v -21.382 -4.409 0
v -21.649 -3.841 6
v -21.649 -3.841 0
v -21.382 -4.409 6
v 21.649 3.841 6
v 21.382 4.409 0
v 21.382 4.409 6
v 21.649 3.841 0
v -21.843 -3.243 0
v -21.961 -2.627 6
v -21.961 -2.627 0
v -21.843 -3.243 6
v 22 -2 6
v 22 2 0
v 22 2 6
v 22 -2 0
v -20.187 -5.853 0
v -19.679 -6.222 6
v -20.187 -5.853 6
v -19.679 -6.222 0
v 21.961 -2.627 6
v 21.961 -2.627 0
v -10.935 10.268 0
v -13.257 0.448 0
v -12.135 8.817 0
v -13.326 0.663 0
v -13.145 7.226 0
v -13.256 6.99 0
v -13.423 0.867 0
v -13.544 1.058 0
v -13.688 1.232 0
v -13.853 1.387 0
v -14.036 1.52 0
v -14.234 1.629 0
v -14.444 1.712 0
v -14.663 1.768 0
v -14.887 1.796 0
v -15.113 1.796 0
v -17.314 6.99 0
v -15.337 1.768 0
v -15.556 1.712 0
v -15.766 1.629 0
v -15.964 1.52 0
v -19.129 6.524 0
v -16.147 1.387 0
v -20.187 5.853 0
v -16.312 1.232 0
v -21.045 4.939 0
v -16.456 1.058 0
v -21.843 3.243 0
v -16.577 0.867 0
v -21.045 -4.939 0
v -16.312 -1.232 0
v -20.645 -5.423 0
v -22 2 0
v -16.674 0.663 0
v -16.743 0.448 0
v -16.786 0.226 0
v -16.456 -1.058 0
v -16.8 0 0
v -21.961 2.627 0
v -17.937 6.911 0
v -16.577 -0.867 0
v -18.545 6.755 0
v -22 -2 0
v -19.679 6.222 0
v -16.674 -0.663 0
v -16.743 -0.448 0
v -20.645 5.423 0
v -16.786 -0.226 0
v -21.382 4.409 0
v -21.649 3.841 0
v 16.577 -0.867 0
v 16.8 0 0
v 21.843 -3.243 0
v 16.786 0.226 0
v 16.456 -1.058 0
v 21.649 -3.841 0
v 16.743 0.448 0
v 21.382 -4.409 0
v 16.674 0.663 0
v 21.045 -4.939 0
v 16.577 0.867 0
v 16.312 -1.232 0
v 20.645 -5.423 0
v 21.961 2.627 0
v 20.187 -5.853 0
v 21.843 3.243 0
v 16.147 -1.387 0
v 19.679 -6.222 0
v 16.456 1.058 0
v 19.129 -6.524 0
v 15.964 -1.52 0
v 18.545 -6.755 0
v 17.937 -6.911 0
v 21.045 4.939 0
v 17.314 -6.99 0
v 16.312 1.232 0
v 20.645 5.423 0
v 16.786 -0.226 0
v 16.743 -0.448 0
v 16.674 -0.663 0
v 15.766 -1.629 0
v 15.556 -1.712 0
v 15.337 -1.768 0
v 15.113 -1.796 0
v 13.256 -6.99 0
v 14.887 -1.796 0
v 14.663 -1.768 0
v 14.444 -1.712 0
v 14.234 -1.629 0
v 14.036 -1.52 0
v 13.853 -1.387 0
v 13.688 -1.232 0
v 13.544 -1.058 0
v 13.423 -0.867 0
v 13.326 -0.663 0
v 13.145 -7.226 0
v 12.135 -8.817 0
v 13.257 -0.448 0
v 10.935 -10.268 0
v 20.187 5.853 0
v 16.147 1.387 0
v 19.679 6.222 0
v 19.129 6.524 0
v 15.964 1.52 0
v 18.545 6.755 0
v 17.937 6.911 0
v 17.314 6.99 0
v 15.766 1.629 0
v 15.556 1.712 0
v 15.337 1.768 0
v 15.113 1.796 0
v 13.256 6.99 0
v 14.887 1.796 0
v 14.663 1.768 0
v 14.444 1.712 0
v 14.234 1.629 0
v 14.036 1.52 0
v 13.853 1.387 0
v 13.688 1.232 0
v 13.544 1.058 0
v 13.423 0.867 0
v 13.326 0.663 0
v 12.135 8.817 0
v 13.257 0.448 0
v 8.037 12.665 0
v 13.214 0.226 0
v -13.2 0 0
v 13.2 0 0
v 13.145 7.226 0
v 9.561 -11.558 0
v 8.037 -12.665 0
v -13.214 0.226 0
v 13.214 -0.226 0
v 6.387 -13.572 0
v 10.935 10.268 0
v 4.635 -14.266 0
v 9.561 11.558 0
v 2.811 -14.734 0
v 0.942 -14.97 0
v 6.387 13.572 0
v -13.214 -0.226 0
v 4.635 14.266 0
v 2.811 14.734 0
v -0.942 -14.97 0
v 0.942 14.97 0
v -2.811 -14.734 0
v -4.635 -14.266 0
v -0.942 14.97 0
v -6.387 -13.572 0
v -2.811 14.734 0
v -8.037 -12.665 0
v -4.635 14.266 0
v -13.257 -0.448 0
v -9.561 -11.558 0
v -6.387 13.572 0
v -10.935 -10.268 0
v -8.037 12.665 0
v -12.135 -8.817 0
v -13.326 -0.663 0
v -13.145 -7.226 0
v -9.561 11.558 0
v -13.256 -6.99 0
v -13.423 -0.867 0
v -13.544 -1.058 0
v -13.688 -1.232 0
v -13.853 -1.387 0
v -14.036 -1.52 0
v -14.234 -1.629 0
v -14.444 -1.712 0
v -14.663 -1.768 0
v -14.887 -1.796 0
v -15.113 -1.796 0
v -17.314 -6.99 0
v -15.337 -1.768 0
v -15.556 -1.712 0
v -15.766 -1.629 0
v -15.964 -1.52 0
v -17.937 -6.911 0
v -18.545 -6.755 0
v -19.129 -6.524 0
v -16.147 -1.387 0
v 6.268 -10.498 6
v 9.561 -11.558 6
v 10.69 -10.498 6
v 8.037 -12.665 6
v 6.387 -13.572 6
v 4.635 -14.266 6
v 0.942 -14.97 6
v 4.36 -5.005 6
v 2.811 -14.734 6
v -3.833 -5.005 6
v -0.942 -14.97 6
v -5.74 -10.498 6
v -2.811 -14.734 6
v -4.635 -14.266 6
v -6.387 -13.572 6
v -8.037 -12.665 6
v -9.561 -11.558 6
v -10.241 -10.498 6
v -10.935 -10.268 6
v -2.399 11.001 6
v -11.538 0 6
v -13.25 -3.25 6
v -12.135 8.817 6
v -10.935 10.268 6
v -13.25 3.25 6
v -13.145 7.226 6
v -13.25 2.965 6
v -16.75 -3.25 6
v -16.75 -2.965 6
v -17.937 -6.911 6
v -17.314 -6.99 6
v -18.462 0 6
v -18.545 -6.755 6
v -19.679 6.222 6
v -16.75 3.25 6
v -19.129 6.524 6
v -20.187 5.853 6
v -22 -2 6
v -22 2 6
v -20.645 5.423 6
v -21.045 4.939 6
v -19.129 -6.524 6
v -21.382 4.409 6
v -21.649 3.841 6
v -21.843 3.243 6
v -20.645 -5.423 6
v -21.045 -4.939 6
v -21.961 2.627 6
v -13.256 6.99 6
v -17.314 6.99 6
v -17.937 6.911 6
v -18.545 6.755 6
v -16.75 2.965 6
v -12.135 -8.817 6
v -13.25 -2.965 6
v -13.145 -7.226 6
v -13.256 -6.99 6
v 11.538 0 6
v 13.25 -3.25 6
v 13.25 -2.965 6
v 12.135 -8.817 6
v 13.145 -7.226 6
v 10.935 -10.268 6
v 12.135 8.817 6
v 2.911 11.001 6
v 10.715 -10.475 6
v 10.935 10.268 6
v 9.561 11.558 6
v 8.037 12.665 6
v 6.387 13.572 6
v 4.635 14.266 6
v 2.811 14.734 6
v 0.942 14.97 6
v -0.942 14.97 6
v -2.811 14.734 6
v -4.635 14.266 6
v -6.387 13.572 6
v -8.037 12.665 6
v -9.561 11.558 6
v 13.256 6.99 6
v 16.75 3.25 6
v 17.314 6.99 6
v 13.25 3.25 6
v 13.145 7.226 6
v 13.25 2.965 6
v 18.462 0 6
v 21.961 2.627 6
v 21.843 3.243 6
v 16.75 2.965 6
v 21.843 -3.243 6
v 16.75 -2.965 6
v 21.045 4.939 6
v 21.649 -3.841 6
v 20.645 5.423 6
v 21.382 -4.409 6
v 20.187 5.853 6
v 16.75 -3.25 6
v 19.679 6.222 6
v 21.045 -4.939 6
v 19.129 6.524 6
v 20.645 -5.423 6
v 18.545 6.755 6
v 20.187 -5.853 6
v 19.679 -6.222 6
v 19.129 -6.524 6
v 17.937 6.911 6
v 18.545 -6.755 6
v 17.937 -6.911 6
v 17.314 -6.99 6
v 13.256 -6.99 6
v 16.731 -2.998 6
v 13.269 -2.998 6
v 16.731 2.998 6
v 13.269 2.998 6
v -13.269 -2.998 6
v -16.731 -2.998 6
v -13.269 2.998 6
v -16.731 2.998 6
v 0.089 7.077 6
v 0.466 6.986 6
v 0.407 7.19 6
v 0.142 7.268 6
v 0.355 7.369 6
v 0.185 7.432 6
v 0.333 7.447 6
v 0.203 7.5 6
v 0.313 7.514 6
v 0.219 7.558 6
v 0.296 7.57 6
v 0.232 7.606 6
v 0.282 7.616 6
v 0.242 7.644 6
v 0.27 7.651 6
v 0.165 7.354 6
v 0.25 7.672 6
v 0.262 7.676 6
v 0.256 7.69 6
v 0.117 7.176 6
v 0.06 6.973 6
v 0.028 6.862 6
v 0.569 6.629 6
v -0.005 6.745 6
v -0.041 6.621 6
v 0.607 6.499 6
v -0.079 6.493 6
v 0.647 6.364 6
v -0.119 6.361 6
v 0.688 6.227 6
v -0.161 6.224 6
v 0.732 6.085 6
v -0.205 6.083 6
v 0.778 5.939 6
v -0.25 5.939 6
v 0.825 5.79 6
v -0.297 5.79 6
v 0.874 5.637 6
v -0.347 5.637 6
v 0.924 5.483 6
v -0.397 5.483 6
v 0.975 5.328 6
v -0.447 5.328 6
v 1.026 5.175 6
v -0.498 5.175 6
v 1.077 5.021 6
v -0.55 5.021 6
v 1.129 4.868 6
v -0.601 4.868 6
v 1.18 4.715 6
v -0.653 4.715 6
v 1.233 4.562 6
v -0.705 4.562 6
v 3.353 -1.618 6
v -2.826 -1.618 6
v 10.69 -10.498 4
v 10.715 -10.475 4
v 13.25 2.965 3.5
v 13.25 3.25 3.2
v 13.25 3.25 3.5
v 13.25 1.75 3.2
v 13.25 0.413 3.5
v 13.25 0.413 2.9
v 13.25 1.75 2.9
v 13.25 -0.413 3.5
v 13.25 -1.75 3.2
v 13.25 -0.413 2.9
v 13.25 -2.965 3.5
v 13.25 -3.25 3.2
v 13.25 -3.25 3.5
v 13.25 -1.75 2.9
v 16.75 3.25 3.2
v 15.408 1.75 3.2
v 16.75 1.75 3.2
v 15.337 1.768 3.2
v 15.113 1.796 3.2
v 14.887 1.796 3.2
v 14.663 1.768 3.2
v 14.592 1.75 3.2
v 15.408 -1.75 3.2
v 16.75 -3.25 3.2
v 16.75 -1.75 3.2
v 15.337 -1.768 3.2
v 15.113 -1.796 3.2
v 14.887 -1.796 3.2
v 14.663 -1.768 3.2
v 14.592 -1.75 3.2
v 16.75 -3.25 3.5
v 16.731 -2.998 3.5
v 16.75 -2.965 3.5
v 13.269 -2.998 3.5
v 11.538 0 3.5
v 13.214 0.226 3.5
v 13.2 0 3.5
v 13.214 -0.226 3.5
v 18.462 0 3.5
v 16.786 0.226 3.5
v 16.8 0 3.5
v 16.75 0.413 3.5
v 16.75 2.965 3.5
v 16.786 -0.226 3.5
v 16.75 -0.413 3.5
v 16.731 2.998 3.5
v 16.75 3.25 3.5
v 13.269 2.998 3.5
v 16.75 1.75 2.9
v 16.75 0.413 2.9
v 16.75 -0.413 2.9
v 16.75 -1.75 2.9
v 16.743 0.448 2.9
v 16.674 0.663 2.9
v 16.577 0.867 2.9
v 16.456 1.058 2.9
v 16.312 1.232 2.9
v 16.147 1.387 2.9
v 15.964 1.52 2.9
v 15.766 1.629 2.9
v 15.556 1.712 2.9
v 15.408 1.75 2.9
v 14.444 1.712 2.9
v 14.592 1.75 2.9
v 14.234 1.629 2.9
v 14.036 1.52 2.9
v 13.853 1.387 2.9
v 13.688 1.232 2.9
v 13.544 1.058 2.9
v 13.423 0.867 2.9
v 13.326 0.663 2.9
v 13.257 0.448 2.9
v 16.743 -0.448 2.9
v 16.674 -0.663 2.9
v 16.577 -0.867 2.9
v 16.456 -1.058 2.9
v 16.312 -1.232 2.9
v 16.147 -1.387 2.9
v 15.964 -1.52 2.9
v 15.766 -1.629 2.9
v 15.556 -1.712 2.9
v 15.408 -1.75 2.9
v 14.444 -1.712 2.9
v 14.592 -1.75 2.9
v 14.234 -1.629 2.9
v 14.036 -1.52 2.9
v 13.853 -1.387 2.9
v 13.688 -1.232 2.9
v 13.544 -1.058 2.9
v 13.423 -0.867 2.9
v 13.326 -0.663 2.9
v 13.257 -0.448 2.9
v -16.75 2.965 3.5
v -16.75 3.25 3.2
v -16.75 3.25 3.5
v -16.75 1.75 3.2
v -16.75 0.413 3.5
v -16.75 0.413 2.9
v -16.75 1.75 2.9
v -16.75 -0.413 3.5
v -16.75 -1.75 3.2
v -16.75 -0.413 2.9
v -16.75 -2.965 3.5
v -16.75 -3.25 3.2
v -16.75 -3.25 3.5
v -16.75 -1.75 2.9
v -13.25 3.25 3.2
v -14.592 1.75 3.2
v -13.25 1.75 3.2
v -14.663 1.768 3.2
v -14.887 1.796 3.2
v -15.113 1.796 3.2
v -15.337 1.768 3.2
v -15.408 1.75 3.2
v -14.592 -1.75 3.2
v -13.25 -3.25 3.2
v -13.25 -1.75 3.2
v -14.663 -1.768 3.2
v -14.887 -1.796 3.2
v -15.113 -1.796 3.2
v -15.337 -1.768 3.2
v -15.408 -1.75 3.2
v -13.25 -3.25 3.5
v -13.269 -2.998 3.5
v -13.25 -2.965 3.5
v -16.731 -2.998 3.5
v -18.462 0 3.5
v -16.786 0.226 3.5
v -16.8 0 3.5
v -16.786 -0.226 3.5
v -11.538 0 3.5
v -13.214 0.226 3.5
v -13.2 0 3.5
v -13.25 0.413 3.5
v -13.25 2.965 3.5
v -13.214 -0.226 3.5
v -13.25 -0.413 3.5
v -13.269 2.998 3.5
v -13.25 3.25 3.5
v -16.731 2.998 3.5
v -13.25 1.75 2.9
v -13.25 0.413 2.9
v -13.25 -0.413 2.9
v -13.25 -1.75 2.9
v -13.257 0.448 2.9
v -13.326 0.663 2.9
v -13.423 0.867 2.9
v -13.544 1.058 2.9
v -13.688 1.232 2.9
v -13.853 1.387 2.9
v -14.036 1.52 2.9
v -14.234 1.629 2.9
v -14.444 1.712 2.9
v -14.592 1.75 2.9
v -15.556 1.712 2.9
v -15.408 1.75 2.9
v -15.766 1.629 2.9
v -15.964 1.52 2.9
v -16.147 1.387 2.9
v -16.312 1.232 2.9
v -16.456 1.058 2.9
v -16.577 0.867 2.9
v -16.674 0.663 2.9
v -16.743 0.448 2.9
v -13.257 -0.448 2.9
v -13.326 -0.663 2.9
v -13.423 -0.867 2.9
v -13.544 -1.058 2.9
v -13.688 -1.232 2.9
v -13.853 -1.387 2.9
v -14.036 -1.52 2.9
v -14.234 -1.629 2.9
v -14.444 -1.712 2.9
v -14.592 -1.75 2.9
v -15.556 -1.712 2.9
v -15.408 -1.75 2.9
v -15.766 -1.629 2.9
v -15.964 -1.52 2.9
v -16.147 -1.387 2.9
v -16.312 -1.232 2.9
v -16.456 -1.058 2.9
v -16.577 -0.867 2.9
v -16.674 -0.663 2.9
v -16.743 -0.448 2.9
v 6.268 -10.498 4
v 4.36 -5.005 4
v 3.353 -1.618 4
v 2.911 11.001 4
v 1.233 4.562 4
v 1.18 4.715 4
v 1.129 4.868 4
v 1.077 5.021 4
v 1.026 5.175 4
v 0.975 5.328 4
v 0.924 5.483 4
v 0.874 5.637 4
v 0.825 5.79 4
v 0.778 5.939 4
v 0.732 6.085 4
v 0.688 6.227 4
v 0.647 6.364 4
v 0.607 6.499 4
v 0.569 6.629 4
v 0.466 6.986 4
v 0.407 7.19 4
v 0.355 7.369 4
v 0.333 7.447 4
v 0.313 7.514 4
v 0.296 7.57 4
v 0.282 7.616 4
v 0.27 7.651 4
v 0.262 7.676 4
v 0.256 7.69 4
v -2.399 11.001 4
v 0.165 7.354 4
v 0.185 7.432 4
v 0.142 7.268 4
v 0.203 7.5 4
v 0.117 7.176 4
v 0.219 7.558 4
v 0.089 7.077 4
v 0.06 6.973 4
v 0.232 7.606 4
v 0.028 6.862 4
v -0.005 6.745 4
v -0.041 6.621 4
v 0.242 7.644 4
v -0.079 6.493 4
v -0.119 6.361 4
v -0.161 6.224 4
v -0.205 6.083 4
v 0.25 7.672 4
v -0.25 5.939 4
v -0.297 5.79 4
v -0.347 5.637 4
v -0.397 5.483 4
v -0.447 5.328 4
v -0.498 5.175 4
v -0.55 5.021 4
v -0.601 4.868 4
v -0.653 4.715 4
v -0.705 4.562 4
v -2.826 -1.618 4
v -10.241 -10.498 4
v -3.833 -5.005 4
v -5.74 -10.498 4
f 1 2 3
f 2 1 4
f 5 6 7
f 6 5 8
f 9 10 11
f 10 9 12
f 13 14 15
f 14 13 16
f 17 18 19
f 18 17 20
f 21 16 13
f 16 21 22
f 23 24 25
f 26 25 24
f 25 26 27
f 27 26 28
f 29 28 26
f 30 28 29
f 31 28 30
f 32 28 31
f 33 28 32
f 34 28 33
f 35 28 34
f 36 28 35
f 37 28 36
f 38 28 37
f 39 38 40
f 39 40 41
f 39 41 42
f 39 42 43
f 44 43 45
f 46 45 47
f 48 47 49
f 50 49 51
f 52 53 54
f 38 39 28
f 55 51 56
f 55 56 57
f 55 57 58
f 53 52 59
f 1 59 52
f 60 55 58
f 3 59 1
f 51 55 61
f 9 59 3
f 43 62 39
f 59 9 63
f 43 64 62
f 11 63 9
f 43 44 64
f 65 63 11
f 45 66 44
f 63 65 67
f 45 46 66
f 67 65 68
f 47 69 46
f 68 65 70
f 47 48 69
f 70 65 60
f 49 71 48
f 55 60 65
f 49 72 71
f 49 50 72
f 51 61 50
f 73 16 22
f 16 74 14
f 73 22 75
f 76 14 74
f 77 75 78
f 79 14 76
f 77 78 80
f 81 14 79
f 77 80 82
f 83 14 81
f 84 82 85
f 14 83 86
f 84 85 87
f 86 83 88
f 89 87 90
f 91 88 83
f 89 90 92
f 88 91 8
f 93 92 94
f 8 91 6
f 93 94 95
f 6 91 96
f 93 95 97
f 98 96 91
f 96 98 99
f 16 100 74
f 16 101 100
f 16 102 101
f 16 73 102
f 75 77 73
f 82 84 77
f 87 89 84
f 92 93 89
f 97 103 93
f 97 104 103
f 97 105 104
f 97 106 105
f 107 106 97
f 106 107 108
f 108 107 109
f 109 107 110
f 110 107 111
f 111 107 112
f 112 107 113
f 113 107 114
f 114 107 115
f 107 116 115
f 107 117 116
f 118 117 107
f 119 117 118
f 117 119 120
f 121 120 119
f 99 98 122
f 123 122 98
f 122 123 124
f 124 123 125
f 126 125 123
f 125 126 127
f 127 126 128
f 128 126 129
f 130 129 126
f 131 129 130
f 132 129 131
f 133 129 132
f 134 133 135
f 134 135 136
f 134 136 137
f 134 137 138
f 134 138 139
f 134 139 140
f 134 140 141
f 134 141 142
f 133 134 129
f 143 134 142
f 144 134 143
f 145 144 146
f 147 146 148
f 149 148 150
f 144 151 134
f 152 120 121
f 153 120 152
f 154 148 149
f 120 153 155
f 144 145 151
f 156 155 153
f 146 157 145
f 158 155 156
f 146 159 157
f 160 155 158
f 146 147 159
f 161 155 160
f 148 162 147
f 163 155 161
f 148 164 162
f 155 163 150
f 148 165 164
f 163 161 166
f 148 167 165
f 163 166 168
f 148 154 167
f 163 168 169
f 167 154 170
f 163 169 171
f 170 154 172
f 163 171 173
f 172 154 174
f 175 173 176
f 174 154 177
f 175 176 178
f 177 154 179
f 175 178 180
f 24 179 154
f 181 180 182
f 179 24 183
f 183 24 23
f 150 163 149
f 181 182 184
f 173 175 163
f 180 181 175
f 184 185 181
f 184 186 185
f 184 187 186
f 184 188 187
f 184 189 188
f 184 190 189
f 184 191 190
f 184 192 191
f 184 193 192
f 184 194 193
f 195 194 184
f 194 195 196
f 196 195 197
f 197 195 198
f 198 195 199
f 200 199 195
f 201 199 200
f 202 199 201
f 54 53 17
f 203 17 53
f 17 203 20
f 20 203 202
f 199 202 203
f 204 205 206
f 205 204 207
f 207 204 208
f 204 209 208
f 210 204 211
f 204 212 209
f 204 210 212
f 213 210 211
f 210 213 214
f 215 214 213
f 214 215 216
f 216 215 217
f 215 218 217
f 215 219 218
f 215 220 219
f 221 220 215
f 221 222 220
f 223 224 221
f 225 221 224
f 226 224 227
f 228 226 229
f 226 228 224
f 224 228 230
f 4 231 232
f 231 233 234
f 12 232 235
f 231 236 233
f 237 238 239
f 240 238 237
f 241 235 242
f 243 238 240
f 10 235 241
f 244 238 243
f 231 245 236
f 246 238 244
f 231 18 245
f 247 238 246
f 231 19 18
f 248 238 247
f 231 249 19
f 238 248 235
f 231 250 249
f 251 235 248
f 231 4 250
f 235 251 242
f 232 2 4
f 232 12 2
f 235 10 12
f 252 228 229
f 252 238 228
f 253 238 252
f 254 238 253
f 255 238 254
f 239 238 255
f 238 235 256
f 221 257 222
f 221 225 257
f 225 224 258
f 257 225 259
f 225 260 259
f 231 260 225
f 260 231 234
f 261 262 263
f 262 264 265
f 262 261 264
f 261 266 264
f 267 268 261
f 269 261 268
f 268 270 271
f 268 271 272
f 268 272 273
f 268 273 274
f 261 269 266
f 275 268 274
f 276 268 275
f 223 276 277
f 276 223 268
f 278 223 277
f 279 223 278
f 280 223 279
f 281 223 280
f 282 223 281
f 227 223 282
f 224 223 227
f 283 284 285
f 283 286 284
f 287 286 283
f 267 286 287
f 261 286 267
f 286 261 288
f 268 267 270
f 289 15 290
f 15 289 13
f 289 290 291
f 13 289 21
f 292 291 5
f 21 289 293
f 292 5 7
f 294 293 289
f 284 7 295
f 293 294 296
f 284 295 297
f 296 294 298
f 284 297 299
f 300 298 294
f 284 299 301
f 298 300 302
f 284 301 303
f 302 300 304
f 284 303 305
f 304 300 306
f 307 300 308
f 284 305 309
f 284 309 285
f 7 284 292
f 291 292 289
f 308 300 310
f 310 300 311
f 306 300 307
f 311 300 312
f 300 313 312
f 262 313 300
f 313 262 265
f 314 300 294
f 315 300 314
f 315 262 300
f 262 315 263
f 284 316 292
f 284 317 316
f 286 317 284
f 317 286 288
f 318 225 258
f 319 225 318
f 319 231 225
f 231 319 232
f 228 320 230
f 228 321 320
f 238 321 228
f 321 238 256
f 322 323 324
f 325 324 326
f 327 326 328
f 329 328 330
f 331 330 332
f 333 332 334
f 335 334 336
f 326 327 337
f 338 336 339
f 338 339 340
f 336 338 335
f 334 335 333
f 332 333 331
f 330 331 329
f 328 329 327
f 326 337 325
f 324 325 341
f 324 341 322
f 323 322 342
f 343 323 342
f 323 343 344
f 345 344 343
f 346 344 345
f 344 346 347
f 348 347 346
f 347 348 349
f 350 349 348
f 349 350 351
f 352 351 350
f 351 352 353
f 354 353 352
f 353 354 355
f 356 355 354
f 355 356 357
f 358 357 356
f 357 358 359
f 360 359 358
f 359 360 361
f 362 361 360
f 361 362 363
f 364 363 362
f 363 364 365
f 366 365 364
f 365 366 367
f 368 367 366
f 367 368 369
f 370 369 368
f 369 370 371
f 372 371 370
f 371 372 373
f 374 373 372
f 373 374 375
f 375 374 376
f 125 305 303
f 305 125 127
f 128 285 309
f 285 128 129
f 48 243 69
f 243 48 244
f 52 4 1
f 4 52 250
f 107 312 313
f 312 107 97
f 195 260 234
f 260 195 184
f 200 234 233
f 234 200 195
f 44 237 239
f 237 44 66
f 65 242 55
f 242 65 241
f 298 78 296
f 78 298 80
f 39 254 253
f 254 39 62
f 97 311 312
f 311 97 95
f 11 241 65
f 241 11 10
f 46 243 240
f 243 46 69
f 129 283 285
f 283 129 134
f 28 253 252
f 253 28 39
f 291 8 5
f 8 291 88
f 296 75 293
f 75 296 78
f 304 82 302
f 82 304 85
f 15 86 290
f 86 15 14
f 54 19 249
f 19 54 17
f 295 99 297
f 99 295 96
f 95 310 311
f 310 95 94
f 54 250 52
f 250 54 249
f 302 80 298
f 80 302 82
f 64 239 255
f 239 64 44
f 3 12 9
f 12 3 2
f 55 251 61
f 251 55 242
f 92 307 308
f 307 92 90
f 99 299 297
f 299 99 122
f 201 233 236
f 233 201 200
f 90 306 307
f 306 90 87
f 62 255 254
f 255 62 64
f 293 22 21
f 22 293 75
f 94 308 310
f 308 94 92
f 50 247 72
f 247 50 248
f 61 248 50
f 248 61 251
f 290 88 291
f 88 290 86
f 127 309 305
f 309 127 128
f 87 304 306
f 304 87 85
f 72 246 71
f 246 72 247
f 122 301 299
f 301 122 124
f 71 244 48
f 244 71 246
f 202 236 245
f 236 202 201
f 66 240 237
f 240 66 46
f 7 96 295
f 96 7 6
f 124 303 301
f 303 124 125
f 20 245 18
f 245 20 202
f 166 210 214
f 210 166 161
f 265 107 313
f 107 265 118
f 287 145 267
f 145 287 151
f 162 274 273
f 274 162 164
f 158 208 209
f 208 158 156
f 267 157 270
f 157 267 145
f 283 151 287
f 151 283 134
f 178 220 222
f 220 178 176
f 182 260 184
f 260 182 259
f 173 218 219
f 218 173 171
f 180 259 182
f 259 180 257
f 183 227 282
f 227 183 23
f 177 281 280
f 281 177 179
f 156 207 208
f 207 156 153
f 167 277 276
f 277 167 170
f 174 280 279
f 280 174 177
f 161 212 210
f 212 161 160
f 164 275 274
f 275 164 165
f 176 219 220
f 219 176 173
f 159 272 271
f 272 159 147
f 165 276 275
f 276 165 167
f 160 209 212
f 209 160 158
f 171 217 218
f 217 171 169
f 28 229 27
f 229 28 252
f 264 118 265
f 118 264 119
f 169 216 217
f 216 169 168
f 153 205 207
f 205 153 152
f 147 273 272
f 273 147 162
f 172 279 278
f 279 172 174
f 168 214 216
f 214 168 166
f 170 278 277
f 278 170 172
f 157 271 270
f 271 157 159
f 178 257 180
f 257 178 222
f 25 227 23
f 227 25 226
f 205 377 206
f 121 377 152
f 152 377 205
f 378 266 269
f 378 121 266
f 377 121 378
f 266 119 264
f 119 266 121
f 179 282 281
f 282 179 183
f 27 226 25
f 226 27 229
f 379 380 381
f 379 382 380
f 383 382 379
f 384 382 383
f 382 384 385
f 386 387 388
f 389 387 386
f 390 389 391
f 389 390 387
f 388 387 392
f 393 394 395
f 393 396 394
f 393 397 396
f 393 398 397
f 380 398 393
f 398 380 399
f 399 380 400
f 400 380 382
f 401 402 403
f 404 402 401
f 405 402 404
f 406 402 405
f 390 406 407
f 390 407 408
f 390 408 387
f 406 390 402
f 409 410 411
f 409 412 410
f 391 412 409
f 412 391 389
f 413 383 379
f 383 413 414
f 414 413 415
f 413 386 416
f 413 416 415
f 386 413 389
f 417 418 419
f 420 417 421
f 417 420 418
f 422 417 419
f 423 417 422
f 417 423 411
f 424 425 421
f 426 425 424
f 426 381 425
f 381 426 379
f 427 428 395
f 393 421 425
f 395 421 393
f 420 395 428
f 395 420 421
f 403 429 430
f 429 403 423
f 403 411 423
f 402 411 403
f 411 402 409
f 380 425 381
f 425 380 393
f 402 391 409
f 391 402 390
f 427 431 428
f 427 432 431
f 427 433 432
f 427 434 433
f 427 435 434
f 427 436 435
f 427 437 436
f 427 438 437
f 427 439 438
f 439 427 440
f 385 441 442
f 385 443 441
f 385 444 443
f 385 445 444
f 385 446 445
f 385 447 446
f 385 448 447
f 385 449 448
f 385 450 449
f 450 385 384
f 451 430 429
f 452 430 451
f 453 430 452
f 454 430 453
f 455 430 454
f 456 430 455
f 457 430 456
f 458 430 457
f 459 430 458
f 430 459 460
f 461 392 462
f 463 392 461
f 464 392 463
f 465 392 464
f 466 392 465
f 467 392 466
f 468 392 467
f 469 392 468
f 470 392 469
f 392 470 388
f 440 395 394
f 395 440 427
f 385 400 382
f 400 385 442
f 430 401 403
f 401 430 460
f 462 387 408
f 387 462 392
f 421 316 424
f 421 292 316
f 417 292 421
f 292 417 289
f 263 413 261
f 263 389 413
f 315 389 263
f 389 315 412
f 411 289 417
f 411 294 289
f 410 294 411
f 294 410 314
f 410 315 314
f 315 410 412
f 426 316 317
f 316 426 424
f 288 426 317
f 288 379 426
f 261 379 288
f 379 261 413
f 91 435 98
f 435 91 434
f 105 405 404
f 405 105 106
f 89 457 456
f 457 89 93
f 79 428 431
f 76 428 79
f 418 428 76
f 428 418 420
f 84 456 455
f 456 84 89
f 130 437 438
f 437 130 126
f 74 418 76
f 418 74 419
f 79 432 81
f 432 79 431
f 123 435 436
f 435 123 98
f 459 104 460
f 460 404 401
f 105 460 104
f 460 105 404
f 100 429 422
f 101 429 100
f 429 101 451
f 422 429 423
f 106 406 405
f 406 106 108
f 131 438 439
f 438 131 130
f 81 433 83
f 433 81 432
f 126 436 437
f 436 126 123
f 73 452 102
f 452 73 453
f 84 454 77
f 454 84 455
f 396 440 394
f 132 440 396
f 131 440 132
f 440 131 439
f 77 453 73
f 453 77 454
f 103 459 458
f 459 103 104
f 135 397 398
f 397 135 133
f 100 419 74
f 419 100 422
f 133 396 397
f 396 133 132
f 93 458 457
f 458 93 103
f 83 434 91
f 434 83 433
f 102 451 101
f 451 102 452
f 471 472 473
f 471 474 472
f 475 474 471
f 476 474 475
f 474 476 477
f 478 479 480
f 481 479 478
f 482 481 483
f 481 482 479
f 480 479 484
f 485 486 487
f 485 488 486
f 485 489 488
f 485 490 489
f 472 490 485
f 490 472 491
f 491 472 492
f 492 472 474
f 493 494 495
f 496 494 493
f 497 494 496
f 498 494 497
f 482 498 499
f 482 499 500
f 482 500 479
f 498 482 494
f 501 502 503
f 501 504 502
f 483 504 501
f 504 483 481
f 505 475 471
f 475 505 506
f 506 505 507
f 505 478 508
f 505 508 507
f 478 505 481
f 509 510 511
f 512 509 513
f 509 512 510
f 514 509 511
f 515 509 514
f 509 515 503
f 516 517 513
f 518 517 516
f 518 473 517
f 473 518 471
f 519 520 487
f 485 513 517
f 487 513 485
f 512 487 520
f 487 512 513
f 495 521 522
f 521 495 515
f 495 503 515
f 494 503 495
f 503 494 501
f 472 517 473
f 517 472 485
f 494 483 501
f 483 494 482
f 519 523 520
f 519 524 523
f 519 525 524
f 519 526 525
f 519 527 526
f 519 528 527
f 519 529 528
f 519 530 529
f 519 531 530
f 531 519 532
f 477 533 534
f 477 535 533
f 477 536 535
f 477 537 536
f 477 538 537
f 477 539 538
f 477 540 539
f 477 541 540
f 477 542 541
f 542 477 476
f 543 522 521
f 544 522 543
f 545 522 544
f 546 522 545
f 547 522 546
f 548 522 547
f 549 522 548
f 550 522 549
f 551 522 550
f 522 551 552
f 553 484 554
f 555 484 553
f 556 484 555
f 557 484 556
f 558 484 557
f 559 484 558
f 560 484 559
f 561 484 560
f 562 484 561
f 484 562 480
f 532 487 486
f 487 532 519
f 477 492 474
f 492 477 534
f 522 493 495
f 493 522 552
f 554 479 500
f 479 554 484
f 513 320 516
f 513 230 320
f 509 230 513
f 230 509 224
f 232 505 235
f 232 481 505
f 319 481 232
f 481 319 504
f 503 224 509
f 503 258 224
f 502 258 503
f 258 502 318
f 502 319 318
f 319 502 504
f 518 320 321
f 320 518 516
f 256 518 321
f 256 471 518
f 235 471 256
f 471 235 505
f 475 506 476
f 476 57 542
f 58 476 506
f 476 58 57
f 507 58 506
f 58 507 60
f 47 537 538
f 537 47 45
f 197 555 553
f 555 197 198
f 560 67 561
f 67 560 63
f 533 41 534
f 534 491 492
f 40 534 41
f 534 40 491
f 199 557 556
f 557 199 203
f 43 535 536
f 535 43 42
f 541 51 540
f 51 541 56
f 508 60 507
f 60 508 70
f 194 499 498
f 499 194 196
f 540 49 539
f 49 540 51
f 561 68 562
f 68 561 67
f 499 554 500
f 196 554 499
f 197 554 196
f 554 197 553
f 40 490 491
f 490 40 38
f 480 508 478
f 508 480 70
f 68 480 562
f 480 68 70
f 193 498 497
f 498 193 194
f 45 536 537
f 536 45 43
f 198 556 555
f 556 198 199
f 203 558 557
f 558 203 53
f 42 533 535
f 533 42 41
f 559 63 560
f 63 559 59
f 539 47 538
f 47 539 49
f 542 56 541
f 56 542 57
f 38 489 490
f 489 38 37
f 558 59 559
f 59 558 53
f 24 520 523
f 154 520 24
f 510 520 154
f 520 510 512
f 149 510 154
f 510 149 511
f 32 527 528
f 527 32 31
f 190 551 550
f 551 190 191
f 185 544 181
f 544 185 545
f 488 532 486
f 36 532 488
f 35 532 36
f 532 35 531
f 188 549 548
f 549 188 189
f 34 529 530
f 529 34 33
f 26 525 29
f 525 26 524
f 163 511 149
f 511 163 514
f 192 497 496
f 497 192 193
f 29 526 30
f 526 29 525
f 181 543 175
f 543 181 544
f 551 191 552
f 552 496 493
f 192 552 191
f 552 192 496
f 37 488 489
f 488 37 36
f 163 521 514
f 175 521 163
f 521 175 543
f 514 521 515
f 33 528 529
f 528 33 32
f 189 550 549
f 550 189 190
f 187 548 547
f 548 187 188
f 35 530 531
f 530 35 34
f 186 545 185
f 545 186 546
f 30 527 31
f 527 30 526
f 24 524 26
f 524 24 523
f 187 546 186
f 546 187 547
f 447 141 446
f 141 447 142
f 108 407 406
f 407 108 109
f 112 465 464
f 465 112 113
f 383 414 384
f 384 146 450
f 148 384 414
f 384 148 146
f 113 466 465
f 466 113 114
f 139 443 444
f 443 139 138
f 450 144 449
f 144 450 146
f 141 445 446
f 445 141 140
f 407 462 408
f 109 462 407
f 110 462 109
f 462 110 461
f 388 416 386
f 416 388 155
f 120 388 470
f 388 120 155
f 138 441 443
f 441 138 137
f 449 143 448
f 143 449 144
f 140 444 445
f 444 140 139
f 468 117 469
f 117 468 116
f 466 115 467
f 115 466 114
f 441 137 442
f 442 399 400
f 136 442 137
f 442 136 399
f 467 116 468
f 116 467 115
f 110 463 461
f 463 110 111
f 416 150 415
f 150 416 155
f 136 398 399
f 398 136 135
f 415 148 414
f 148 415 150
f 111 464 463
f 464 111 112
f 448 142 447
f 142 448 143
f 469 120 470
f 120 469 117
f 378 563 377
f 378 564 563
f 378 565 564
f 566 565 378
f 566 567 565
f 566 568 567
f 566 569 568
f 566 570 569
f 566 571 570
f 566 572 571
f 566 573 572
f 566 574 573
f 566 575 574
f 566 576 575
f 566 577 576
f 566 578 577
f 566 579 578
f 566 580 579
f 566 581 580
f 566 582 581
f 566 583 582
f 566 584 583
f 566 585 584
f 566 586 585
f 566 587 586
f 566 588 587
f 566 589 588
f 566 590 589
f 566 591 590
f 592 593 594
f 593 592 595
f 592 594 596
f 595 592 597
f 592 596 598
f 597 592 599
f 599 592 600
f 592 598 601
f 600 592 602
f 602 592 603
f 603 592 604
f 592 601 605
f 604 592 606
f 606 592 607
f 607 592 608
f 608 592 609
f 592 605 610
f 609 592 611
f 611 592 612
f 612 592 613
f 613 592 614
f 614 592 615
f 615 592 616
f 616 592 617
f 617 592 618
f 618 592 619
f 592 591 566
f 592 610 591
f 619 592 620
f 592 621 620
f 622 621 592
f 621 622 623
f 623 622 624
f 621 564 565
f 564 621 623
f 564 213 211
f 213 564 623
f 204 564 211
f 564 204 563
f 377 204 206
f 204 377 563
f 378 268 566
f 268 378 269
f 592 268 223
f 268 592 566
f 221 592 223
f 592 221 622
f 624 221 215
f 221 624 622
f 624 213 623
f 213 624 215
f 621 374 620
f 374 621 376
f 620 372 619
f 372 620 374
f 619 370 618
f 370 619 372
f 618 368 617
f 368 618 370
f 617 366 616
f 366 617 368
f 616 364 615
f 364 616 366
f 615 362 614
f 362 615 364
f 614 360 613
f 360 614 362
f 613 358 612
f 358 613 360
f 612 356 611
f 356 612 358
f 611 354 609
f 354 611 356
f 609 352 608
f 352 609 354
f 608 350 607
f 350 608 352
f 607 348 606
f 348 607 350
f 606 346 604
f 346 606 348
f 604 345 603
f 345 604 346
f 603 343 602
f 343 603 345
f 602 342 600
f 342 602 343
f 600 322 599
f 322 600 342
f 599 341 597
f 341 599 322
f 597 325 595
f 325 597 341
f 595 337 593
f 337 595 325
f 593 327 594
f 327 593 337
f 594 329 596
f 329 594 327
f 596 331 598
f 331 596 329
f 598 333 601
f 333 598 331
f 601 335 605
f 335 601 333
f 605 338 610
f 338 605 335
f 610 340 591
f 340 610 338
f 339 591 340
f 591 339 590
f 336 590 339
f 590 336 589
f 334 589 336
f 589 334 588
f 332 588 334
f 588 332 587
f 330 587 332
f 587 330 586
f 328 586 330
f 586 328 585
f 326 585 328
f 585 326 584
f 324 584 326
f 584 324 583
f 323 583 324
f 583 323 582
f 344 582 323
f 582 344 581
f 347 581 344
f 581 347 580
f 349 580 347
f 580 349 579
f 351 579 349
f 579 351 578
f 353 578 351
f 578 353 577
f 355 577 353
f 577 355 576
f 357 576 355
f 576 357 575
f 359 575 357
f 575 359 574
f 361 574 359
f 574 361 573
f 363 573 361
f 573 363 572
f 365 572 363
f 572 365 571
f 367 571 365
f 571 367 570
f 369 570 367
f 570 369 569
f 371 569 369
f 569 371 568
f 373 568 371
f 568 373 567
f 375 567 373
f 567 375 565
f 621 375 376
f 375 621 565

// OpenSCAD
$fn = 50;


difference() {
	union() {
		hull() {
			translate(v = [-17.0000000000, 2.0000000000, 0]) {
				cylinder(h = 6, r = 5);
			}
			translate(v = [17.0000000000, 2.0000000000, 0]) {
				cylinder(h = 6, r = 5);
			}
			translate(v = [-17.0000000000, -2.0000000000, 0]) {
				cylinder(h = 6, r = 5);
			}
			translate(v = [17.0000000000, -2.0000000000, 0]) {
				cylinder(h = 6, r = 5);
			}
		}
		cylinder(h = 6, r = 15.0000000000);
	}
	union() {
		translate(v = [15.0000000000, 0, -20]) {
			rotate(a = [0, 180, 0]) {
				difference() {
					union() {
						translate(v = [0, 0, -26.0000000000]) {
							rotate(a = [0, 0, 0]) {
								difference() {
									union() {
										#translate(v = [-1.7500000000, -3.2500000000, -0.3000000000]) {
											cube(size = [3.5000000000, 6.5000000000, 0.3000000000]);
										}
										#translate(v = [-1.7500000000, -1.7500000000, -0.6000000000]) {
											cube(size = [3.5000000000, 3.5000000000, 0.3000000000]);
										}
										#translate(v = [-1.7500000000, -3.2500000000, 2.5000000000]) {
											cube(size = [3.5000000000, 6.5000000000, 0.3000000000]);
										}
										#translate(v = [-1.7500000000, -1.7500000000, 2.8000000000]) {
											cube(size = [3.5000000000, 3.5000000000, 0.3000000000]);
										}
										#linear_extrude(height = 2.5000000000) {
											polygon(points = [[3.4620000000, 0.0000000000], [1.7310000000, 2.9981799479], [-1.7310000000, 2.9981799479], [-3.4620000000, 0.0000000000], [-1.7310000000, -2.9981799479], [1.7310000000, -2.9981799479]]);
										}
										#translate(v = [-1.7500000000, -3.2500000000, -0.3000000000]) {
											cube(size = [3.5000000000, 6.5000000000, 0.3000000000]);
										}
										#translate(v = [-1.7500000000, -1.7500000000, -0.6000000000]) {
											cube(size = [3.5000000000, 3.5000000000, 0.3000000000]);
										}
										#translate(v = [-1.7500000000, -3.2500000000, 2.5000000000]) {
											cube(size = [3.5000000000, 6.5000000000, 0.3000000000]);
										}
										#translate(v = [-1.7500000000, -1.7500000000, 2.8000000000]) {
											cube(size = [3.5000000000, 3.5000000000, 0.3000000000]);
										}
										#translate(v = [-1.7500000000, -3.2500000000, -0.3000000000]) {
											cube(size = [3.5000000000, 6.5000000000, 0.3000000000]);
										}
										#translate(v = [-1.7500000000, -1.7500000000, -0.6000000000]) {
											cube(size = [3.5000000000, 3.5000000000, 0.3000000000]);
										}
										#translate(v = [-1.7500000000, -3.2500000000, 2.5000000000]) {
											cube(size = [3.5000000000, 6.5000000000, 0.3000000000]);
										}
										#translate(v = [-1.7500000000, -1.7500000000, 2.8000000000]) {
											cube(size = [3.5000000000, 3.5000000000, 0.3000000000]);
										}
									}
									union();
								}
							}
						}
						translate(v = [0, 0, -26.0000000000]) {
							rotate(a = [0, 0, 0]) {
								difference() {
									union() {
										#translate(v = [-1.7500000000, -3.2500000000, -0.3000000000]) {
											cube(size = [3.5000000000, 6.5000000000, 0.3000000000]);
										}
										#translate(v = [-1.7500000000, -1.7500000000, -0.6000000000]) {
											cube(size = [3.5000000000, 3.5000000000, 0.3000000000]);
										}
										#translate(v = [-1.7500000000, -3.2500000000, 2.5000000000]) {
											cube(size = [3.5000000000, 6.5000000000, 0.3000000000]);
										}
										#translate(v = [-1.7500000000, -1.7500000000, 2.8000000000]) {
											cube(size = [3.5000000000, 3.5000000000, 0.3000000000]);
										}
										#linear_extrude(height = 2.5000000000) {
											polygon(points = [[3.4620000000, 0.0000000000], [1.7310000000, 2.9981799479], [-1.7310000000, 2.9981799479], [-3.4620000000, 0.0000000000], [-1.7310000000, -2.9981799479], [1.7310000000, -2.9981799479]]);
										}
										#translate(v = [-1.7500000000, -3.2500000000, -0.3000000000]) {
											cube(size = [3.5000000000, 6.5000000000, 0.3000000000]);
										}
										#translate(v = [-1.7500000000, -1.7500000000, -0.6000000000]) {
											cube(size = [3.5000000000, 3.5000000000, 0.3000000000]);
										}
										#translate(v = [-1.7500000000, -3.2500000000, 2.5000000000]) {
											cube(size = [3.5000000000, 6.5000000000, 0.3000000000]);
										}
										#translate(v = [-1.7500000000, -1.7500000000, 2.8000000000]) {
											cube(size = [3.5000000000, 3.5000000000, 0.3000000000]);
										}
										#translate(v = [-1.7500000000, -3.2500000000, -0.3000000000]) {
											cube(size = [3.5000000000, 6.5000000000, 0.3000000000]);
										}
										#translate(v = [-1.7500000000, -1.7500000000, -0.6000000000]) {
											cube(size = [3.5000000000, 3.5000000000, 0.3000000000]);
										}
										#translate(v = [-1.7500000000, -3.2500000000, 2.5000000000]) {
											cube(size = [3.5000000000, 6.5000000000, 0.3000000000]);
										}
										#translate(v = [-1.7500000000, -1.7500000000, 2.8000000000]) {
											cube(size = [3.5000000000, 3.5000000000, 0.3000000000]);
										}
									}
									union();
								}
							}
						}
						translate(v = [0, 0, -26.0000000000]) {
							rotate(a = [0, 0, 0]) {
								difference() {
									union() {
										#translate(v = [-1.7500000000, -3.2500000000, -0.3000000000]) {
											cube(size = [3.5000000000, 6.5000000000, 0.3000000000]);
										}
										#translate(v = [-1.7500000000, -1.7500000000, -0.6000000000]) {
											cube(size = [3.5000000000, 3.5000000000, 0.3000000000]);
										}
										#translate(v = [-1.7500000000, -3.2500000000, 2.5000000000]) {
											cube(size = [3.5000000000, 6.5000000000, 0.3000000000]);
										}
										#translate(v = [-1.7500000000, -1.7500000000, 2.8000000000]) {
											cube(size = [3.5000000000, 3.5000000000, 0.3000000000]);
										}
										#linear_extrude(height = 2.5000000000) {
											polygon(points = [[3.4620000000, 0.0000000000], [1.7310000000, 2.9981799479], [-1.7310000000, 2.9981799479], [-3.4620000000, 0.0000000000], [-1.7310000000, -2.9981799479], [1.7310000000, -2.9981799479]]);
										}
										#translate(v = [-1.7500000000, -3.2500000000, -0.3000000000]) {
											cube(size = [3.5000000000, 6.5000000000, 0.3000000000]);
										}
										#translate(v = [-1.7500000000, -1.7500000000, -0.6000000000]) {
											cube(size = [3.5000000000, 3.5000000000, 0.3000000000]);
										}
										#translate(v = [-1.7500000000, -3.2500000000, 2.5000000000]) {
											cube(size = [3.5000000000, 6.5000000000, 0.3000000000]);
										}
										#translate(v = [-1.7500000000, -1.7500000000, 2.8000000000]) {
											cube(size = [3.5000000000, 3.5000000000, 0.3000000000]);
										}
										#translate(v = [-1.7500000000, -3.2500000000, -0.3000000000]) {
											cube(size = [3.5000000000, 6.5000000000, 0.3000000000]);
										}
										#translate(v = [-1.7500000000, -1.7500000000, -0.6000000000]) {
											cube(size = [3.5000000000, 3.5000000000, 0.3000000000]);
										}
										#translate(v = [-1.7500000000, -3.2500000000, 2.5000000000]) {
											cube(size = [3.5000000000, 6.5000000000, 0.3000000000]);
										}
										#translate(v = [-1.7500000000, -1.7500000000, 2.8000000000]) {
											cube(size = [3.5000000000, 3.5000000000, 0.3000000000]);
										}
									}
									union();
								}
							}
						}
						#translate(v = [0, 0, -26.0000000000]) {
							cylinder(h = 26, r = 1.5000000000);
						}
						#translate(v = [0, 0, -1.9000000000]) {
							cylinder(h = 1.9000000000, r1 = 1.8000000000, r2 = 3.6000000000);
						}
						#translate(v = [0, 0, -26.0000000000]) {
							cylinder(h = 26, r = 1.8000000000);
						}
						#translate(v = [0, 0, -26.0000000000]) {
							cylinder(h = 26, r = 1.5000000000);
						}
					}
					union();
				}
			}
		}
		translate(v = [-15.0000000000, 0, -20]) {
			rotate(a = [0, 180, 0]) {
				difference() {
					union() {
						translate(v = [0, 0, -26.0000000000]) {
							rotate(a = [0, 0, 0]) {
								difference() {
									union() {
										#translate(v = [-1.7500000000, -3.2500000000, -0.3000000000]) {
											cube(size = [3.5000000000, 6.5000000000, 0.3000000000]);
										}
										#translate(v = [-1.7500000000, -1.7500000000, -0.6000000000]) {
											cube(size = [3.5000000000, 3.5000000000, 0.3000000000]);
										}
										#translate(v = [-1.7500000000, -3.2500000000, 2.5000000000]) {
											cube(size = [3.5000000000, 6.5000000000, 0.3000000000]);
										}
										#translate(v = [-1.7500000000, -1.7500000000, 2.8000000000]) {
											cube(size = [3.5000000000, 3.5000000000, 0.3000000000]);
										}
										#linear_extrude(height = 2.5000000000) {
											polygon(points = [[3.4620000000, 0.0000000000], [1.7310000000, 2.9981799479], [-1.7310000000, 2.9981799479], [-3.4620000000, 0.0000000000], [-1.7310000000, -2.9981799479], [1.7310000000, -2.9981799479]]);
										}
										#translate(v = [-1.7500000000, -3.2500000000, -0.3000000000]) {
											cube(size = [3.5000000000, 6.5000000000, 0.3000000000]);
										}
										#translate(v = [-1.7500000000, -1.7500000000, -0.6000000000]) {
											cube(size = [3.5000000000, 3.5000000000, 0.3000000000]);
										}
										#translate(v = [-1.7500000000, -3.2500000000, 2.5000000000]) {
											cube(size = [3.5000000000, 6.5000000000, 0.3000000000]);
										}
										#translate(v = [-1.7500000000, -1.7500000000, 2.8000000000]) {
											cube(size = [3.5000000000, 3.5000000000, 0.3000000000]);
										}
										#translate(v = [-1.7500000000, -3.2500000000, -0.3000000000]) {
											cube(size = [3.5000000000, 6.5000000000, 0.3000000000]);
										}
										#translate(v = [-1.7500000000, -1.7500000000, -0.6000000000]) {
											cube(size = [3.5000000000, 3.5000000000, 0.3000000000]);
										}
										#translate(v = [-1.7500000000, -3.2500000000, 2.5000000000]) {
											cube(size = [3.5000000000, 6.5000000000, 0.3000000000]);
										}
										#translate(v = [-1.7500000000, -1.7500000000, 2.8000000000]) {
											cube(size = [3.5000000000, 3.5000000000, 0.3000000000]);
										}
									}
									union();
								}
							}
						}
						translate(v = [0, 0, -26.0000000000]) {
							rotate(a = [0, 0, 0]) {
								difference() {
									union() {
										#translate(v = [-1.7500000000, -3.2500000000, -0.3000000000]) {
											cube(size = [3.5000000000, 6.5000000000, 0.3000000000]);
										}
										#translate(v = [-1.7500000000, -1.7500000000, -0.6000000000]) {
											cube(size = [3.5000000000, 3.5000000000, 0.3000000000]);
										}
										#translate(v = [-1.7500000000, -3.2500000000, 2.5000000000]) {
											cube(size = [3.5000000000, 6.5000000000, 0.3000000000]);
										}
										#translate(v = [-1.7500000000, -1.7500000000, 2.8000000000]) {
											cube(size = [3.5000000000, 3.5000000000, 0.3000000000]);
										}
										#linear_extrude(height = 2.5000000000) {
											polygon(points = [[3.4620000000, 0.0000000000], [1.7310000000, 2.9981799479], [-1.7310000000, 2.9981799479], [-3.4620000000, 0.0000000000], [-1.7310000000, -2.9981799479], [1.7310000000, -2.9981799479]]);
										}
										#translate(v = [-1.7500000000, -3.2500000000, -0.3000000000]) {
											cube(size = [3.5000000000, 6.5000000000, 0.3000000000]);
										}
										#translate(v = [-1.7500000000, -1.7500000000, -0.6000000000]) {
											cube(size = [3.5000000000, 3.5000000000, 0.3000000000]);
										}
										#translate(v = [-1.7500000000, -3.2500000000, 2.5000000000]) {
											cube(size = [3.5000000000, 6.5000000000, 0.3000000000]);
										}
										#translate(v = [-1.7500000000, -1.7500000000, 2.8000000000]) {
											cube(size = [3.5000000000, 3.5000000000, 0.3000000000]);
										}
										#translate(v = [-1.7500000000, -3.2500000000, -0.3000000000]) {
											cube(size = [3.5000000000, 6.5000000000, 0.3000000000]);
										}
										#translate(v = [-1.7500000000, -1.7500000000, -0.6000000000]) {
											cube(size = [3.5000000000, 3.5000000000, 0.3000000000]);
										}
										#translate(v = [-1.7500000000, -3.2500000000, 2.5000000000]) {
											cube(size = [3.5000000000, 6.5000000000, 0.3000000000]);
										}
										#translate(v = [-1.7500000000, -1.7500000000, 2.8000000000]) {
											cube(size = [3.5000000000, 3.5000000000, 0.3000000000]);
										}
									}
									union();
								}
							}
						}
						translate(v = [0, 0, -26.0000000000]) {
							rotate(a = [0, 0, 0]) {
								difference() {
									union() {
										#translate(v = [-1.7500000000, -3.2500000000, -0.3000000000]) {
											cube(size = [3.5000000000, 6.5000000000, 0.3000000000]);
										}
										#translate(v = [-1.7500000000, -1.7500000000, -0.6000000000]) {
											cube(size = [3.5000000000, 3.5000000000, 0.3000000000]);
										}
										#translate(v = [-1.7500000000, -3.2500000000, 2.5000000000]) {
											cube(size = [3.5000000000, 6.5000000000, 0.3000000000]);
										}
										#translate(v = [-1.7500000000, -1.7500000000, 2.8000000000]) {
											cube(size = [3.5000000000, 3.5000000000, 0.3000000000]);
										}
										#linear_extrude(height = 2.5000000000) {
											polygon(points = [[3.4620000000, 0.0000000000], [1.7310000000, 2.9981799479], [-1.7310000000, 2.9981799479], [-3.4620000000, 0.0000000000], [-1.7310000000, -2.9981799479], [1.7310000000, -2.9981799479]]);
										}
										#translate(v = [-1.7500000000, -3.2500000000, -0.3000000000]) {
											cube(size = [3.5000000000, 6.5000000000, 0.3000000000]);
										}
										#translate(v = [-1.7500000000, -1.7500000000, -0.6000000000]) {
											cube(size = [3.5000000000, 3.5000000000, 0.3000000000]);
										}
										#translate(v = [-1.7500000000, -3.2500000000, 2.5000000000]) {
											cube(size = [3.5000000000, 6.5000000000, 0.3000000000]);
										}
										#translate(v = [-1.7500000000, -1.7500000000, 2.8000000000]) {
											cube(size = [3.5000000000, 3.5000000000, 0.3000000000]);
										}
										#translate(v = [-1.7500000000, -3.2500000000, -0.3000000000]) {
											cube(size = [3.5000000000, 6.5000000000, 0.3000000000]);
										}
										#translate(v = [-1.7500000000, -1.7500000000, -0.6000000000]) {
											cube(size = [3.5000000000, 3.5000000000, 0.3000000000]);
										}
										#translate(v = [-1.7500000000, -3.2500000000, 2.5000000000]) {
											cube(size = [3.5000000000, 6.5000000000, 0.3000000000]);
										}
										#translate(v = [-1.7500000000, -1.7500000000, 2.8000000000]) {
											cube(size = [3.5000000000, 3.5000000000, 0.3000000000]);
										}
									}
									union();
								}
							}
						}
						#translate(v = [0, 0, -26.0000000000]) {
							cylinder(h = 26, r = 1.5000000000);
						}
						#translate(v = [0, 0, -1.9000000000]) {
							cylinder(h = 1.9000000000, r1 = 1.8000000000, r2 = 3.6000000000);
						}
						#translate(v = [0, 0, -26.0000000000]) {
							cylinder(h = 26, r = 1.8000000000);
						}
						#translate(v = [0, 0, -26.0000000000]) {
							cylinder(h = 26, r = 1.5000000000);
						}
					}
					union();
				}
			}
		}
		translate(v = [-15.0000000000, 0.0000000000, 0]) {
			cylinder(h = 6, r = 1.8000000000);
		}
		translate(v = [15.0000000000, 0.0000000000, 0]) {
			cylinder(h = 6, r = 1.8000000000);
		}
		translate(v = [-15.0000000000, 0.0000000000, 0]) {
			cylinder(h = 6, r = 1.8000000000);
		}
		translate(v = [15.0000000000, 0.0000000000, 0]) {
			cylinder(h = 6, r = 1.8000000000);
		}
		translate(v = [-15.0000000000, 0.0000000000, 0]) {
			cylinder(h = 6, r = 1.8000000000);
		}
		translate(v = [15.0000000000, 0.0000000000, 0]) {
			cylinder(h = 6, r = 1.8000000000);
		}
		translate(v = [-15.0000000000, 0.0000000000, 0]) {
			cylinder(h = 6, r = 1.8000000000);
		}
		translate(v = [15.0000000000, 0.0000000000, 0]) {
			cylinder(h = 6, r = 1.8000000000);
		}
		#translate(v = [0, 0, 4]) {
			linear_extrude(height = 2) {
				text(font = "Arial:Bold", halign = "center", size = 22.5000000000, text = "A", valign = "center");
			}
		}
	}
}
